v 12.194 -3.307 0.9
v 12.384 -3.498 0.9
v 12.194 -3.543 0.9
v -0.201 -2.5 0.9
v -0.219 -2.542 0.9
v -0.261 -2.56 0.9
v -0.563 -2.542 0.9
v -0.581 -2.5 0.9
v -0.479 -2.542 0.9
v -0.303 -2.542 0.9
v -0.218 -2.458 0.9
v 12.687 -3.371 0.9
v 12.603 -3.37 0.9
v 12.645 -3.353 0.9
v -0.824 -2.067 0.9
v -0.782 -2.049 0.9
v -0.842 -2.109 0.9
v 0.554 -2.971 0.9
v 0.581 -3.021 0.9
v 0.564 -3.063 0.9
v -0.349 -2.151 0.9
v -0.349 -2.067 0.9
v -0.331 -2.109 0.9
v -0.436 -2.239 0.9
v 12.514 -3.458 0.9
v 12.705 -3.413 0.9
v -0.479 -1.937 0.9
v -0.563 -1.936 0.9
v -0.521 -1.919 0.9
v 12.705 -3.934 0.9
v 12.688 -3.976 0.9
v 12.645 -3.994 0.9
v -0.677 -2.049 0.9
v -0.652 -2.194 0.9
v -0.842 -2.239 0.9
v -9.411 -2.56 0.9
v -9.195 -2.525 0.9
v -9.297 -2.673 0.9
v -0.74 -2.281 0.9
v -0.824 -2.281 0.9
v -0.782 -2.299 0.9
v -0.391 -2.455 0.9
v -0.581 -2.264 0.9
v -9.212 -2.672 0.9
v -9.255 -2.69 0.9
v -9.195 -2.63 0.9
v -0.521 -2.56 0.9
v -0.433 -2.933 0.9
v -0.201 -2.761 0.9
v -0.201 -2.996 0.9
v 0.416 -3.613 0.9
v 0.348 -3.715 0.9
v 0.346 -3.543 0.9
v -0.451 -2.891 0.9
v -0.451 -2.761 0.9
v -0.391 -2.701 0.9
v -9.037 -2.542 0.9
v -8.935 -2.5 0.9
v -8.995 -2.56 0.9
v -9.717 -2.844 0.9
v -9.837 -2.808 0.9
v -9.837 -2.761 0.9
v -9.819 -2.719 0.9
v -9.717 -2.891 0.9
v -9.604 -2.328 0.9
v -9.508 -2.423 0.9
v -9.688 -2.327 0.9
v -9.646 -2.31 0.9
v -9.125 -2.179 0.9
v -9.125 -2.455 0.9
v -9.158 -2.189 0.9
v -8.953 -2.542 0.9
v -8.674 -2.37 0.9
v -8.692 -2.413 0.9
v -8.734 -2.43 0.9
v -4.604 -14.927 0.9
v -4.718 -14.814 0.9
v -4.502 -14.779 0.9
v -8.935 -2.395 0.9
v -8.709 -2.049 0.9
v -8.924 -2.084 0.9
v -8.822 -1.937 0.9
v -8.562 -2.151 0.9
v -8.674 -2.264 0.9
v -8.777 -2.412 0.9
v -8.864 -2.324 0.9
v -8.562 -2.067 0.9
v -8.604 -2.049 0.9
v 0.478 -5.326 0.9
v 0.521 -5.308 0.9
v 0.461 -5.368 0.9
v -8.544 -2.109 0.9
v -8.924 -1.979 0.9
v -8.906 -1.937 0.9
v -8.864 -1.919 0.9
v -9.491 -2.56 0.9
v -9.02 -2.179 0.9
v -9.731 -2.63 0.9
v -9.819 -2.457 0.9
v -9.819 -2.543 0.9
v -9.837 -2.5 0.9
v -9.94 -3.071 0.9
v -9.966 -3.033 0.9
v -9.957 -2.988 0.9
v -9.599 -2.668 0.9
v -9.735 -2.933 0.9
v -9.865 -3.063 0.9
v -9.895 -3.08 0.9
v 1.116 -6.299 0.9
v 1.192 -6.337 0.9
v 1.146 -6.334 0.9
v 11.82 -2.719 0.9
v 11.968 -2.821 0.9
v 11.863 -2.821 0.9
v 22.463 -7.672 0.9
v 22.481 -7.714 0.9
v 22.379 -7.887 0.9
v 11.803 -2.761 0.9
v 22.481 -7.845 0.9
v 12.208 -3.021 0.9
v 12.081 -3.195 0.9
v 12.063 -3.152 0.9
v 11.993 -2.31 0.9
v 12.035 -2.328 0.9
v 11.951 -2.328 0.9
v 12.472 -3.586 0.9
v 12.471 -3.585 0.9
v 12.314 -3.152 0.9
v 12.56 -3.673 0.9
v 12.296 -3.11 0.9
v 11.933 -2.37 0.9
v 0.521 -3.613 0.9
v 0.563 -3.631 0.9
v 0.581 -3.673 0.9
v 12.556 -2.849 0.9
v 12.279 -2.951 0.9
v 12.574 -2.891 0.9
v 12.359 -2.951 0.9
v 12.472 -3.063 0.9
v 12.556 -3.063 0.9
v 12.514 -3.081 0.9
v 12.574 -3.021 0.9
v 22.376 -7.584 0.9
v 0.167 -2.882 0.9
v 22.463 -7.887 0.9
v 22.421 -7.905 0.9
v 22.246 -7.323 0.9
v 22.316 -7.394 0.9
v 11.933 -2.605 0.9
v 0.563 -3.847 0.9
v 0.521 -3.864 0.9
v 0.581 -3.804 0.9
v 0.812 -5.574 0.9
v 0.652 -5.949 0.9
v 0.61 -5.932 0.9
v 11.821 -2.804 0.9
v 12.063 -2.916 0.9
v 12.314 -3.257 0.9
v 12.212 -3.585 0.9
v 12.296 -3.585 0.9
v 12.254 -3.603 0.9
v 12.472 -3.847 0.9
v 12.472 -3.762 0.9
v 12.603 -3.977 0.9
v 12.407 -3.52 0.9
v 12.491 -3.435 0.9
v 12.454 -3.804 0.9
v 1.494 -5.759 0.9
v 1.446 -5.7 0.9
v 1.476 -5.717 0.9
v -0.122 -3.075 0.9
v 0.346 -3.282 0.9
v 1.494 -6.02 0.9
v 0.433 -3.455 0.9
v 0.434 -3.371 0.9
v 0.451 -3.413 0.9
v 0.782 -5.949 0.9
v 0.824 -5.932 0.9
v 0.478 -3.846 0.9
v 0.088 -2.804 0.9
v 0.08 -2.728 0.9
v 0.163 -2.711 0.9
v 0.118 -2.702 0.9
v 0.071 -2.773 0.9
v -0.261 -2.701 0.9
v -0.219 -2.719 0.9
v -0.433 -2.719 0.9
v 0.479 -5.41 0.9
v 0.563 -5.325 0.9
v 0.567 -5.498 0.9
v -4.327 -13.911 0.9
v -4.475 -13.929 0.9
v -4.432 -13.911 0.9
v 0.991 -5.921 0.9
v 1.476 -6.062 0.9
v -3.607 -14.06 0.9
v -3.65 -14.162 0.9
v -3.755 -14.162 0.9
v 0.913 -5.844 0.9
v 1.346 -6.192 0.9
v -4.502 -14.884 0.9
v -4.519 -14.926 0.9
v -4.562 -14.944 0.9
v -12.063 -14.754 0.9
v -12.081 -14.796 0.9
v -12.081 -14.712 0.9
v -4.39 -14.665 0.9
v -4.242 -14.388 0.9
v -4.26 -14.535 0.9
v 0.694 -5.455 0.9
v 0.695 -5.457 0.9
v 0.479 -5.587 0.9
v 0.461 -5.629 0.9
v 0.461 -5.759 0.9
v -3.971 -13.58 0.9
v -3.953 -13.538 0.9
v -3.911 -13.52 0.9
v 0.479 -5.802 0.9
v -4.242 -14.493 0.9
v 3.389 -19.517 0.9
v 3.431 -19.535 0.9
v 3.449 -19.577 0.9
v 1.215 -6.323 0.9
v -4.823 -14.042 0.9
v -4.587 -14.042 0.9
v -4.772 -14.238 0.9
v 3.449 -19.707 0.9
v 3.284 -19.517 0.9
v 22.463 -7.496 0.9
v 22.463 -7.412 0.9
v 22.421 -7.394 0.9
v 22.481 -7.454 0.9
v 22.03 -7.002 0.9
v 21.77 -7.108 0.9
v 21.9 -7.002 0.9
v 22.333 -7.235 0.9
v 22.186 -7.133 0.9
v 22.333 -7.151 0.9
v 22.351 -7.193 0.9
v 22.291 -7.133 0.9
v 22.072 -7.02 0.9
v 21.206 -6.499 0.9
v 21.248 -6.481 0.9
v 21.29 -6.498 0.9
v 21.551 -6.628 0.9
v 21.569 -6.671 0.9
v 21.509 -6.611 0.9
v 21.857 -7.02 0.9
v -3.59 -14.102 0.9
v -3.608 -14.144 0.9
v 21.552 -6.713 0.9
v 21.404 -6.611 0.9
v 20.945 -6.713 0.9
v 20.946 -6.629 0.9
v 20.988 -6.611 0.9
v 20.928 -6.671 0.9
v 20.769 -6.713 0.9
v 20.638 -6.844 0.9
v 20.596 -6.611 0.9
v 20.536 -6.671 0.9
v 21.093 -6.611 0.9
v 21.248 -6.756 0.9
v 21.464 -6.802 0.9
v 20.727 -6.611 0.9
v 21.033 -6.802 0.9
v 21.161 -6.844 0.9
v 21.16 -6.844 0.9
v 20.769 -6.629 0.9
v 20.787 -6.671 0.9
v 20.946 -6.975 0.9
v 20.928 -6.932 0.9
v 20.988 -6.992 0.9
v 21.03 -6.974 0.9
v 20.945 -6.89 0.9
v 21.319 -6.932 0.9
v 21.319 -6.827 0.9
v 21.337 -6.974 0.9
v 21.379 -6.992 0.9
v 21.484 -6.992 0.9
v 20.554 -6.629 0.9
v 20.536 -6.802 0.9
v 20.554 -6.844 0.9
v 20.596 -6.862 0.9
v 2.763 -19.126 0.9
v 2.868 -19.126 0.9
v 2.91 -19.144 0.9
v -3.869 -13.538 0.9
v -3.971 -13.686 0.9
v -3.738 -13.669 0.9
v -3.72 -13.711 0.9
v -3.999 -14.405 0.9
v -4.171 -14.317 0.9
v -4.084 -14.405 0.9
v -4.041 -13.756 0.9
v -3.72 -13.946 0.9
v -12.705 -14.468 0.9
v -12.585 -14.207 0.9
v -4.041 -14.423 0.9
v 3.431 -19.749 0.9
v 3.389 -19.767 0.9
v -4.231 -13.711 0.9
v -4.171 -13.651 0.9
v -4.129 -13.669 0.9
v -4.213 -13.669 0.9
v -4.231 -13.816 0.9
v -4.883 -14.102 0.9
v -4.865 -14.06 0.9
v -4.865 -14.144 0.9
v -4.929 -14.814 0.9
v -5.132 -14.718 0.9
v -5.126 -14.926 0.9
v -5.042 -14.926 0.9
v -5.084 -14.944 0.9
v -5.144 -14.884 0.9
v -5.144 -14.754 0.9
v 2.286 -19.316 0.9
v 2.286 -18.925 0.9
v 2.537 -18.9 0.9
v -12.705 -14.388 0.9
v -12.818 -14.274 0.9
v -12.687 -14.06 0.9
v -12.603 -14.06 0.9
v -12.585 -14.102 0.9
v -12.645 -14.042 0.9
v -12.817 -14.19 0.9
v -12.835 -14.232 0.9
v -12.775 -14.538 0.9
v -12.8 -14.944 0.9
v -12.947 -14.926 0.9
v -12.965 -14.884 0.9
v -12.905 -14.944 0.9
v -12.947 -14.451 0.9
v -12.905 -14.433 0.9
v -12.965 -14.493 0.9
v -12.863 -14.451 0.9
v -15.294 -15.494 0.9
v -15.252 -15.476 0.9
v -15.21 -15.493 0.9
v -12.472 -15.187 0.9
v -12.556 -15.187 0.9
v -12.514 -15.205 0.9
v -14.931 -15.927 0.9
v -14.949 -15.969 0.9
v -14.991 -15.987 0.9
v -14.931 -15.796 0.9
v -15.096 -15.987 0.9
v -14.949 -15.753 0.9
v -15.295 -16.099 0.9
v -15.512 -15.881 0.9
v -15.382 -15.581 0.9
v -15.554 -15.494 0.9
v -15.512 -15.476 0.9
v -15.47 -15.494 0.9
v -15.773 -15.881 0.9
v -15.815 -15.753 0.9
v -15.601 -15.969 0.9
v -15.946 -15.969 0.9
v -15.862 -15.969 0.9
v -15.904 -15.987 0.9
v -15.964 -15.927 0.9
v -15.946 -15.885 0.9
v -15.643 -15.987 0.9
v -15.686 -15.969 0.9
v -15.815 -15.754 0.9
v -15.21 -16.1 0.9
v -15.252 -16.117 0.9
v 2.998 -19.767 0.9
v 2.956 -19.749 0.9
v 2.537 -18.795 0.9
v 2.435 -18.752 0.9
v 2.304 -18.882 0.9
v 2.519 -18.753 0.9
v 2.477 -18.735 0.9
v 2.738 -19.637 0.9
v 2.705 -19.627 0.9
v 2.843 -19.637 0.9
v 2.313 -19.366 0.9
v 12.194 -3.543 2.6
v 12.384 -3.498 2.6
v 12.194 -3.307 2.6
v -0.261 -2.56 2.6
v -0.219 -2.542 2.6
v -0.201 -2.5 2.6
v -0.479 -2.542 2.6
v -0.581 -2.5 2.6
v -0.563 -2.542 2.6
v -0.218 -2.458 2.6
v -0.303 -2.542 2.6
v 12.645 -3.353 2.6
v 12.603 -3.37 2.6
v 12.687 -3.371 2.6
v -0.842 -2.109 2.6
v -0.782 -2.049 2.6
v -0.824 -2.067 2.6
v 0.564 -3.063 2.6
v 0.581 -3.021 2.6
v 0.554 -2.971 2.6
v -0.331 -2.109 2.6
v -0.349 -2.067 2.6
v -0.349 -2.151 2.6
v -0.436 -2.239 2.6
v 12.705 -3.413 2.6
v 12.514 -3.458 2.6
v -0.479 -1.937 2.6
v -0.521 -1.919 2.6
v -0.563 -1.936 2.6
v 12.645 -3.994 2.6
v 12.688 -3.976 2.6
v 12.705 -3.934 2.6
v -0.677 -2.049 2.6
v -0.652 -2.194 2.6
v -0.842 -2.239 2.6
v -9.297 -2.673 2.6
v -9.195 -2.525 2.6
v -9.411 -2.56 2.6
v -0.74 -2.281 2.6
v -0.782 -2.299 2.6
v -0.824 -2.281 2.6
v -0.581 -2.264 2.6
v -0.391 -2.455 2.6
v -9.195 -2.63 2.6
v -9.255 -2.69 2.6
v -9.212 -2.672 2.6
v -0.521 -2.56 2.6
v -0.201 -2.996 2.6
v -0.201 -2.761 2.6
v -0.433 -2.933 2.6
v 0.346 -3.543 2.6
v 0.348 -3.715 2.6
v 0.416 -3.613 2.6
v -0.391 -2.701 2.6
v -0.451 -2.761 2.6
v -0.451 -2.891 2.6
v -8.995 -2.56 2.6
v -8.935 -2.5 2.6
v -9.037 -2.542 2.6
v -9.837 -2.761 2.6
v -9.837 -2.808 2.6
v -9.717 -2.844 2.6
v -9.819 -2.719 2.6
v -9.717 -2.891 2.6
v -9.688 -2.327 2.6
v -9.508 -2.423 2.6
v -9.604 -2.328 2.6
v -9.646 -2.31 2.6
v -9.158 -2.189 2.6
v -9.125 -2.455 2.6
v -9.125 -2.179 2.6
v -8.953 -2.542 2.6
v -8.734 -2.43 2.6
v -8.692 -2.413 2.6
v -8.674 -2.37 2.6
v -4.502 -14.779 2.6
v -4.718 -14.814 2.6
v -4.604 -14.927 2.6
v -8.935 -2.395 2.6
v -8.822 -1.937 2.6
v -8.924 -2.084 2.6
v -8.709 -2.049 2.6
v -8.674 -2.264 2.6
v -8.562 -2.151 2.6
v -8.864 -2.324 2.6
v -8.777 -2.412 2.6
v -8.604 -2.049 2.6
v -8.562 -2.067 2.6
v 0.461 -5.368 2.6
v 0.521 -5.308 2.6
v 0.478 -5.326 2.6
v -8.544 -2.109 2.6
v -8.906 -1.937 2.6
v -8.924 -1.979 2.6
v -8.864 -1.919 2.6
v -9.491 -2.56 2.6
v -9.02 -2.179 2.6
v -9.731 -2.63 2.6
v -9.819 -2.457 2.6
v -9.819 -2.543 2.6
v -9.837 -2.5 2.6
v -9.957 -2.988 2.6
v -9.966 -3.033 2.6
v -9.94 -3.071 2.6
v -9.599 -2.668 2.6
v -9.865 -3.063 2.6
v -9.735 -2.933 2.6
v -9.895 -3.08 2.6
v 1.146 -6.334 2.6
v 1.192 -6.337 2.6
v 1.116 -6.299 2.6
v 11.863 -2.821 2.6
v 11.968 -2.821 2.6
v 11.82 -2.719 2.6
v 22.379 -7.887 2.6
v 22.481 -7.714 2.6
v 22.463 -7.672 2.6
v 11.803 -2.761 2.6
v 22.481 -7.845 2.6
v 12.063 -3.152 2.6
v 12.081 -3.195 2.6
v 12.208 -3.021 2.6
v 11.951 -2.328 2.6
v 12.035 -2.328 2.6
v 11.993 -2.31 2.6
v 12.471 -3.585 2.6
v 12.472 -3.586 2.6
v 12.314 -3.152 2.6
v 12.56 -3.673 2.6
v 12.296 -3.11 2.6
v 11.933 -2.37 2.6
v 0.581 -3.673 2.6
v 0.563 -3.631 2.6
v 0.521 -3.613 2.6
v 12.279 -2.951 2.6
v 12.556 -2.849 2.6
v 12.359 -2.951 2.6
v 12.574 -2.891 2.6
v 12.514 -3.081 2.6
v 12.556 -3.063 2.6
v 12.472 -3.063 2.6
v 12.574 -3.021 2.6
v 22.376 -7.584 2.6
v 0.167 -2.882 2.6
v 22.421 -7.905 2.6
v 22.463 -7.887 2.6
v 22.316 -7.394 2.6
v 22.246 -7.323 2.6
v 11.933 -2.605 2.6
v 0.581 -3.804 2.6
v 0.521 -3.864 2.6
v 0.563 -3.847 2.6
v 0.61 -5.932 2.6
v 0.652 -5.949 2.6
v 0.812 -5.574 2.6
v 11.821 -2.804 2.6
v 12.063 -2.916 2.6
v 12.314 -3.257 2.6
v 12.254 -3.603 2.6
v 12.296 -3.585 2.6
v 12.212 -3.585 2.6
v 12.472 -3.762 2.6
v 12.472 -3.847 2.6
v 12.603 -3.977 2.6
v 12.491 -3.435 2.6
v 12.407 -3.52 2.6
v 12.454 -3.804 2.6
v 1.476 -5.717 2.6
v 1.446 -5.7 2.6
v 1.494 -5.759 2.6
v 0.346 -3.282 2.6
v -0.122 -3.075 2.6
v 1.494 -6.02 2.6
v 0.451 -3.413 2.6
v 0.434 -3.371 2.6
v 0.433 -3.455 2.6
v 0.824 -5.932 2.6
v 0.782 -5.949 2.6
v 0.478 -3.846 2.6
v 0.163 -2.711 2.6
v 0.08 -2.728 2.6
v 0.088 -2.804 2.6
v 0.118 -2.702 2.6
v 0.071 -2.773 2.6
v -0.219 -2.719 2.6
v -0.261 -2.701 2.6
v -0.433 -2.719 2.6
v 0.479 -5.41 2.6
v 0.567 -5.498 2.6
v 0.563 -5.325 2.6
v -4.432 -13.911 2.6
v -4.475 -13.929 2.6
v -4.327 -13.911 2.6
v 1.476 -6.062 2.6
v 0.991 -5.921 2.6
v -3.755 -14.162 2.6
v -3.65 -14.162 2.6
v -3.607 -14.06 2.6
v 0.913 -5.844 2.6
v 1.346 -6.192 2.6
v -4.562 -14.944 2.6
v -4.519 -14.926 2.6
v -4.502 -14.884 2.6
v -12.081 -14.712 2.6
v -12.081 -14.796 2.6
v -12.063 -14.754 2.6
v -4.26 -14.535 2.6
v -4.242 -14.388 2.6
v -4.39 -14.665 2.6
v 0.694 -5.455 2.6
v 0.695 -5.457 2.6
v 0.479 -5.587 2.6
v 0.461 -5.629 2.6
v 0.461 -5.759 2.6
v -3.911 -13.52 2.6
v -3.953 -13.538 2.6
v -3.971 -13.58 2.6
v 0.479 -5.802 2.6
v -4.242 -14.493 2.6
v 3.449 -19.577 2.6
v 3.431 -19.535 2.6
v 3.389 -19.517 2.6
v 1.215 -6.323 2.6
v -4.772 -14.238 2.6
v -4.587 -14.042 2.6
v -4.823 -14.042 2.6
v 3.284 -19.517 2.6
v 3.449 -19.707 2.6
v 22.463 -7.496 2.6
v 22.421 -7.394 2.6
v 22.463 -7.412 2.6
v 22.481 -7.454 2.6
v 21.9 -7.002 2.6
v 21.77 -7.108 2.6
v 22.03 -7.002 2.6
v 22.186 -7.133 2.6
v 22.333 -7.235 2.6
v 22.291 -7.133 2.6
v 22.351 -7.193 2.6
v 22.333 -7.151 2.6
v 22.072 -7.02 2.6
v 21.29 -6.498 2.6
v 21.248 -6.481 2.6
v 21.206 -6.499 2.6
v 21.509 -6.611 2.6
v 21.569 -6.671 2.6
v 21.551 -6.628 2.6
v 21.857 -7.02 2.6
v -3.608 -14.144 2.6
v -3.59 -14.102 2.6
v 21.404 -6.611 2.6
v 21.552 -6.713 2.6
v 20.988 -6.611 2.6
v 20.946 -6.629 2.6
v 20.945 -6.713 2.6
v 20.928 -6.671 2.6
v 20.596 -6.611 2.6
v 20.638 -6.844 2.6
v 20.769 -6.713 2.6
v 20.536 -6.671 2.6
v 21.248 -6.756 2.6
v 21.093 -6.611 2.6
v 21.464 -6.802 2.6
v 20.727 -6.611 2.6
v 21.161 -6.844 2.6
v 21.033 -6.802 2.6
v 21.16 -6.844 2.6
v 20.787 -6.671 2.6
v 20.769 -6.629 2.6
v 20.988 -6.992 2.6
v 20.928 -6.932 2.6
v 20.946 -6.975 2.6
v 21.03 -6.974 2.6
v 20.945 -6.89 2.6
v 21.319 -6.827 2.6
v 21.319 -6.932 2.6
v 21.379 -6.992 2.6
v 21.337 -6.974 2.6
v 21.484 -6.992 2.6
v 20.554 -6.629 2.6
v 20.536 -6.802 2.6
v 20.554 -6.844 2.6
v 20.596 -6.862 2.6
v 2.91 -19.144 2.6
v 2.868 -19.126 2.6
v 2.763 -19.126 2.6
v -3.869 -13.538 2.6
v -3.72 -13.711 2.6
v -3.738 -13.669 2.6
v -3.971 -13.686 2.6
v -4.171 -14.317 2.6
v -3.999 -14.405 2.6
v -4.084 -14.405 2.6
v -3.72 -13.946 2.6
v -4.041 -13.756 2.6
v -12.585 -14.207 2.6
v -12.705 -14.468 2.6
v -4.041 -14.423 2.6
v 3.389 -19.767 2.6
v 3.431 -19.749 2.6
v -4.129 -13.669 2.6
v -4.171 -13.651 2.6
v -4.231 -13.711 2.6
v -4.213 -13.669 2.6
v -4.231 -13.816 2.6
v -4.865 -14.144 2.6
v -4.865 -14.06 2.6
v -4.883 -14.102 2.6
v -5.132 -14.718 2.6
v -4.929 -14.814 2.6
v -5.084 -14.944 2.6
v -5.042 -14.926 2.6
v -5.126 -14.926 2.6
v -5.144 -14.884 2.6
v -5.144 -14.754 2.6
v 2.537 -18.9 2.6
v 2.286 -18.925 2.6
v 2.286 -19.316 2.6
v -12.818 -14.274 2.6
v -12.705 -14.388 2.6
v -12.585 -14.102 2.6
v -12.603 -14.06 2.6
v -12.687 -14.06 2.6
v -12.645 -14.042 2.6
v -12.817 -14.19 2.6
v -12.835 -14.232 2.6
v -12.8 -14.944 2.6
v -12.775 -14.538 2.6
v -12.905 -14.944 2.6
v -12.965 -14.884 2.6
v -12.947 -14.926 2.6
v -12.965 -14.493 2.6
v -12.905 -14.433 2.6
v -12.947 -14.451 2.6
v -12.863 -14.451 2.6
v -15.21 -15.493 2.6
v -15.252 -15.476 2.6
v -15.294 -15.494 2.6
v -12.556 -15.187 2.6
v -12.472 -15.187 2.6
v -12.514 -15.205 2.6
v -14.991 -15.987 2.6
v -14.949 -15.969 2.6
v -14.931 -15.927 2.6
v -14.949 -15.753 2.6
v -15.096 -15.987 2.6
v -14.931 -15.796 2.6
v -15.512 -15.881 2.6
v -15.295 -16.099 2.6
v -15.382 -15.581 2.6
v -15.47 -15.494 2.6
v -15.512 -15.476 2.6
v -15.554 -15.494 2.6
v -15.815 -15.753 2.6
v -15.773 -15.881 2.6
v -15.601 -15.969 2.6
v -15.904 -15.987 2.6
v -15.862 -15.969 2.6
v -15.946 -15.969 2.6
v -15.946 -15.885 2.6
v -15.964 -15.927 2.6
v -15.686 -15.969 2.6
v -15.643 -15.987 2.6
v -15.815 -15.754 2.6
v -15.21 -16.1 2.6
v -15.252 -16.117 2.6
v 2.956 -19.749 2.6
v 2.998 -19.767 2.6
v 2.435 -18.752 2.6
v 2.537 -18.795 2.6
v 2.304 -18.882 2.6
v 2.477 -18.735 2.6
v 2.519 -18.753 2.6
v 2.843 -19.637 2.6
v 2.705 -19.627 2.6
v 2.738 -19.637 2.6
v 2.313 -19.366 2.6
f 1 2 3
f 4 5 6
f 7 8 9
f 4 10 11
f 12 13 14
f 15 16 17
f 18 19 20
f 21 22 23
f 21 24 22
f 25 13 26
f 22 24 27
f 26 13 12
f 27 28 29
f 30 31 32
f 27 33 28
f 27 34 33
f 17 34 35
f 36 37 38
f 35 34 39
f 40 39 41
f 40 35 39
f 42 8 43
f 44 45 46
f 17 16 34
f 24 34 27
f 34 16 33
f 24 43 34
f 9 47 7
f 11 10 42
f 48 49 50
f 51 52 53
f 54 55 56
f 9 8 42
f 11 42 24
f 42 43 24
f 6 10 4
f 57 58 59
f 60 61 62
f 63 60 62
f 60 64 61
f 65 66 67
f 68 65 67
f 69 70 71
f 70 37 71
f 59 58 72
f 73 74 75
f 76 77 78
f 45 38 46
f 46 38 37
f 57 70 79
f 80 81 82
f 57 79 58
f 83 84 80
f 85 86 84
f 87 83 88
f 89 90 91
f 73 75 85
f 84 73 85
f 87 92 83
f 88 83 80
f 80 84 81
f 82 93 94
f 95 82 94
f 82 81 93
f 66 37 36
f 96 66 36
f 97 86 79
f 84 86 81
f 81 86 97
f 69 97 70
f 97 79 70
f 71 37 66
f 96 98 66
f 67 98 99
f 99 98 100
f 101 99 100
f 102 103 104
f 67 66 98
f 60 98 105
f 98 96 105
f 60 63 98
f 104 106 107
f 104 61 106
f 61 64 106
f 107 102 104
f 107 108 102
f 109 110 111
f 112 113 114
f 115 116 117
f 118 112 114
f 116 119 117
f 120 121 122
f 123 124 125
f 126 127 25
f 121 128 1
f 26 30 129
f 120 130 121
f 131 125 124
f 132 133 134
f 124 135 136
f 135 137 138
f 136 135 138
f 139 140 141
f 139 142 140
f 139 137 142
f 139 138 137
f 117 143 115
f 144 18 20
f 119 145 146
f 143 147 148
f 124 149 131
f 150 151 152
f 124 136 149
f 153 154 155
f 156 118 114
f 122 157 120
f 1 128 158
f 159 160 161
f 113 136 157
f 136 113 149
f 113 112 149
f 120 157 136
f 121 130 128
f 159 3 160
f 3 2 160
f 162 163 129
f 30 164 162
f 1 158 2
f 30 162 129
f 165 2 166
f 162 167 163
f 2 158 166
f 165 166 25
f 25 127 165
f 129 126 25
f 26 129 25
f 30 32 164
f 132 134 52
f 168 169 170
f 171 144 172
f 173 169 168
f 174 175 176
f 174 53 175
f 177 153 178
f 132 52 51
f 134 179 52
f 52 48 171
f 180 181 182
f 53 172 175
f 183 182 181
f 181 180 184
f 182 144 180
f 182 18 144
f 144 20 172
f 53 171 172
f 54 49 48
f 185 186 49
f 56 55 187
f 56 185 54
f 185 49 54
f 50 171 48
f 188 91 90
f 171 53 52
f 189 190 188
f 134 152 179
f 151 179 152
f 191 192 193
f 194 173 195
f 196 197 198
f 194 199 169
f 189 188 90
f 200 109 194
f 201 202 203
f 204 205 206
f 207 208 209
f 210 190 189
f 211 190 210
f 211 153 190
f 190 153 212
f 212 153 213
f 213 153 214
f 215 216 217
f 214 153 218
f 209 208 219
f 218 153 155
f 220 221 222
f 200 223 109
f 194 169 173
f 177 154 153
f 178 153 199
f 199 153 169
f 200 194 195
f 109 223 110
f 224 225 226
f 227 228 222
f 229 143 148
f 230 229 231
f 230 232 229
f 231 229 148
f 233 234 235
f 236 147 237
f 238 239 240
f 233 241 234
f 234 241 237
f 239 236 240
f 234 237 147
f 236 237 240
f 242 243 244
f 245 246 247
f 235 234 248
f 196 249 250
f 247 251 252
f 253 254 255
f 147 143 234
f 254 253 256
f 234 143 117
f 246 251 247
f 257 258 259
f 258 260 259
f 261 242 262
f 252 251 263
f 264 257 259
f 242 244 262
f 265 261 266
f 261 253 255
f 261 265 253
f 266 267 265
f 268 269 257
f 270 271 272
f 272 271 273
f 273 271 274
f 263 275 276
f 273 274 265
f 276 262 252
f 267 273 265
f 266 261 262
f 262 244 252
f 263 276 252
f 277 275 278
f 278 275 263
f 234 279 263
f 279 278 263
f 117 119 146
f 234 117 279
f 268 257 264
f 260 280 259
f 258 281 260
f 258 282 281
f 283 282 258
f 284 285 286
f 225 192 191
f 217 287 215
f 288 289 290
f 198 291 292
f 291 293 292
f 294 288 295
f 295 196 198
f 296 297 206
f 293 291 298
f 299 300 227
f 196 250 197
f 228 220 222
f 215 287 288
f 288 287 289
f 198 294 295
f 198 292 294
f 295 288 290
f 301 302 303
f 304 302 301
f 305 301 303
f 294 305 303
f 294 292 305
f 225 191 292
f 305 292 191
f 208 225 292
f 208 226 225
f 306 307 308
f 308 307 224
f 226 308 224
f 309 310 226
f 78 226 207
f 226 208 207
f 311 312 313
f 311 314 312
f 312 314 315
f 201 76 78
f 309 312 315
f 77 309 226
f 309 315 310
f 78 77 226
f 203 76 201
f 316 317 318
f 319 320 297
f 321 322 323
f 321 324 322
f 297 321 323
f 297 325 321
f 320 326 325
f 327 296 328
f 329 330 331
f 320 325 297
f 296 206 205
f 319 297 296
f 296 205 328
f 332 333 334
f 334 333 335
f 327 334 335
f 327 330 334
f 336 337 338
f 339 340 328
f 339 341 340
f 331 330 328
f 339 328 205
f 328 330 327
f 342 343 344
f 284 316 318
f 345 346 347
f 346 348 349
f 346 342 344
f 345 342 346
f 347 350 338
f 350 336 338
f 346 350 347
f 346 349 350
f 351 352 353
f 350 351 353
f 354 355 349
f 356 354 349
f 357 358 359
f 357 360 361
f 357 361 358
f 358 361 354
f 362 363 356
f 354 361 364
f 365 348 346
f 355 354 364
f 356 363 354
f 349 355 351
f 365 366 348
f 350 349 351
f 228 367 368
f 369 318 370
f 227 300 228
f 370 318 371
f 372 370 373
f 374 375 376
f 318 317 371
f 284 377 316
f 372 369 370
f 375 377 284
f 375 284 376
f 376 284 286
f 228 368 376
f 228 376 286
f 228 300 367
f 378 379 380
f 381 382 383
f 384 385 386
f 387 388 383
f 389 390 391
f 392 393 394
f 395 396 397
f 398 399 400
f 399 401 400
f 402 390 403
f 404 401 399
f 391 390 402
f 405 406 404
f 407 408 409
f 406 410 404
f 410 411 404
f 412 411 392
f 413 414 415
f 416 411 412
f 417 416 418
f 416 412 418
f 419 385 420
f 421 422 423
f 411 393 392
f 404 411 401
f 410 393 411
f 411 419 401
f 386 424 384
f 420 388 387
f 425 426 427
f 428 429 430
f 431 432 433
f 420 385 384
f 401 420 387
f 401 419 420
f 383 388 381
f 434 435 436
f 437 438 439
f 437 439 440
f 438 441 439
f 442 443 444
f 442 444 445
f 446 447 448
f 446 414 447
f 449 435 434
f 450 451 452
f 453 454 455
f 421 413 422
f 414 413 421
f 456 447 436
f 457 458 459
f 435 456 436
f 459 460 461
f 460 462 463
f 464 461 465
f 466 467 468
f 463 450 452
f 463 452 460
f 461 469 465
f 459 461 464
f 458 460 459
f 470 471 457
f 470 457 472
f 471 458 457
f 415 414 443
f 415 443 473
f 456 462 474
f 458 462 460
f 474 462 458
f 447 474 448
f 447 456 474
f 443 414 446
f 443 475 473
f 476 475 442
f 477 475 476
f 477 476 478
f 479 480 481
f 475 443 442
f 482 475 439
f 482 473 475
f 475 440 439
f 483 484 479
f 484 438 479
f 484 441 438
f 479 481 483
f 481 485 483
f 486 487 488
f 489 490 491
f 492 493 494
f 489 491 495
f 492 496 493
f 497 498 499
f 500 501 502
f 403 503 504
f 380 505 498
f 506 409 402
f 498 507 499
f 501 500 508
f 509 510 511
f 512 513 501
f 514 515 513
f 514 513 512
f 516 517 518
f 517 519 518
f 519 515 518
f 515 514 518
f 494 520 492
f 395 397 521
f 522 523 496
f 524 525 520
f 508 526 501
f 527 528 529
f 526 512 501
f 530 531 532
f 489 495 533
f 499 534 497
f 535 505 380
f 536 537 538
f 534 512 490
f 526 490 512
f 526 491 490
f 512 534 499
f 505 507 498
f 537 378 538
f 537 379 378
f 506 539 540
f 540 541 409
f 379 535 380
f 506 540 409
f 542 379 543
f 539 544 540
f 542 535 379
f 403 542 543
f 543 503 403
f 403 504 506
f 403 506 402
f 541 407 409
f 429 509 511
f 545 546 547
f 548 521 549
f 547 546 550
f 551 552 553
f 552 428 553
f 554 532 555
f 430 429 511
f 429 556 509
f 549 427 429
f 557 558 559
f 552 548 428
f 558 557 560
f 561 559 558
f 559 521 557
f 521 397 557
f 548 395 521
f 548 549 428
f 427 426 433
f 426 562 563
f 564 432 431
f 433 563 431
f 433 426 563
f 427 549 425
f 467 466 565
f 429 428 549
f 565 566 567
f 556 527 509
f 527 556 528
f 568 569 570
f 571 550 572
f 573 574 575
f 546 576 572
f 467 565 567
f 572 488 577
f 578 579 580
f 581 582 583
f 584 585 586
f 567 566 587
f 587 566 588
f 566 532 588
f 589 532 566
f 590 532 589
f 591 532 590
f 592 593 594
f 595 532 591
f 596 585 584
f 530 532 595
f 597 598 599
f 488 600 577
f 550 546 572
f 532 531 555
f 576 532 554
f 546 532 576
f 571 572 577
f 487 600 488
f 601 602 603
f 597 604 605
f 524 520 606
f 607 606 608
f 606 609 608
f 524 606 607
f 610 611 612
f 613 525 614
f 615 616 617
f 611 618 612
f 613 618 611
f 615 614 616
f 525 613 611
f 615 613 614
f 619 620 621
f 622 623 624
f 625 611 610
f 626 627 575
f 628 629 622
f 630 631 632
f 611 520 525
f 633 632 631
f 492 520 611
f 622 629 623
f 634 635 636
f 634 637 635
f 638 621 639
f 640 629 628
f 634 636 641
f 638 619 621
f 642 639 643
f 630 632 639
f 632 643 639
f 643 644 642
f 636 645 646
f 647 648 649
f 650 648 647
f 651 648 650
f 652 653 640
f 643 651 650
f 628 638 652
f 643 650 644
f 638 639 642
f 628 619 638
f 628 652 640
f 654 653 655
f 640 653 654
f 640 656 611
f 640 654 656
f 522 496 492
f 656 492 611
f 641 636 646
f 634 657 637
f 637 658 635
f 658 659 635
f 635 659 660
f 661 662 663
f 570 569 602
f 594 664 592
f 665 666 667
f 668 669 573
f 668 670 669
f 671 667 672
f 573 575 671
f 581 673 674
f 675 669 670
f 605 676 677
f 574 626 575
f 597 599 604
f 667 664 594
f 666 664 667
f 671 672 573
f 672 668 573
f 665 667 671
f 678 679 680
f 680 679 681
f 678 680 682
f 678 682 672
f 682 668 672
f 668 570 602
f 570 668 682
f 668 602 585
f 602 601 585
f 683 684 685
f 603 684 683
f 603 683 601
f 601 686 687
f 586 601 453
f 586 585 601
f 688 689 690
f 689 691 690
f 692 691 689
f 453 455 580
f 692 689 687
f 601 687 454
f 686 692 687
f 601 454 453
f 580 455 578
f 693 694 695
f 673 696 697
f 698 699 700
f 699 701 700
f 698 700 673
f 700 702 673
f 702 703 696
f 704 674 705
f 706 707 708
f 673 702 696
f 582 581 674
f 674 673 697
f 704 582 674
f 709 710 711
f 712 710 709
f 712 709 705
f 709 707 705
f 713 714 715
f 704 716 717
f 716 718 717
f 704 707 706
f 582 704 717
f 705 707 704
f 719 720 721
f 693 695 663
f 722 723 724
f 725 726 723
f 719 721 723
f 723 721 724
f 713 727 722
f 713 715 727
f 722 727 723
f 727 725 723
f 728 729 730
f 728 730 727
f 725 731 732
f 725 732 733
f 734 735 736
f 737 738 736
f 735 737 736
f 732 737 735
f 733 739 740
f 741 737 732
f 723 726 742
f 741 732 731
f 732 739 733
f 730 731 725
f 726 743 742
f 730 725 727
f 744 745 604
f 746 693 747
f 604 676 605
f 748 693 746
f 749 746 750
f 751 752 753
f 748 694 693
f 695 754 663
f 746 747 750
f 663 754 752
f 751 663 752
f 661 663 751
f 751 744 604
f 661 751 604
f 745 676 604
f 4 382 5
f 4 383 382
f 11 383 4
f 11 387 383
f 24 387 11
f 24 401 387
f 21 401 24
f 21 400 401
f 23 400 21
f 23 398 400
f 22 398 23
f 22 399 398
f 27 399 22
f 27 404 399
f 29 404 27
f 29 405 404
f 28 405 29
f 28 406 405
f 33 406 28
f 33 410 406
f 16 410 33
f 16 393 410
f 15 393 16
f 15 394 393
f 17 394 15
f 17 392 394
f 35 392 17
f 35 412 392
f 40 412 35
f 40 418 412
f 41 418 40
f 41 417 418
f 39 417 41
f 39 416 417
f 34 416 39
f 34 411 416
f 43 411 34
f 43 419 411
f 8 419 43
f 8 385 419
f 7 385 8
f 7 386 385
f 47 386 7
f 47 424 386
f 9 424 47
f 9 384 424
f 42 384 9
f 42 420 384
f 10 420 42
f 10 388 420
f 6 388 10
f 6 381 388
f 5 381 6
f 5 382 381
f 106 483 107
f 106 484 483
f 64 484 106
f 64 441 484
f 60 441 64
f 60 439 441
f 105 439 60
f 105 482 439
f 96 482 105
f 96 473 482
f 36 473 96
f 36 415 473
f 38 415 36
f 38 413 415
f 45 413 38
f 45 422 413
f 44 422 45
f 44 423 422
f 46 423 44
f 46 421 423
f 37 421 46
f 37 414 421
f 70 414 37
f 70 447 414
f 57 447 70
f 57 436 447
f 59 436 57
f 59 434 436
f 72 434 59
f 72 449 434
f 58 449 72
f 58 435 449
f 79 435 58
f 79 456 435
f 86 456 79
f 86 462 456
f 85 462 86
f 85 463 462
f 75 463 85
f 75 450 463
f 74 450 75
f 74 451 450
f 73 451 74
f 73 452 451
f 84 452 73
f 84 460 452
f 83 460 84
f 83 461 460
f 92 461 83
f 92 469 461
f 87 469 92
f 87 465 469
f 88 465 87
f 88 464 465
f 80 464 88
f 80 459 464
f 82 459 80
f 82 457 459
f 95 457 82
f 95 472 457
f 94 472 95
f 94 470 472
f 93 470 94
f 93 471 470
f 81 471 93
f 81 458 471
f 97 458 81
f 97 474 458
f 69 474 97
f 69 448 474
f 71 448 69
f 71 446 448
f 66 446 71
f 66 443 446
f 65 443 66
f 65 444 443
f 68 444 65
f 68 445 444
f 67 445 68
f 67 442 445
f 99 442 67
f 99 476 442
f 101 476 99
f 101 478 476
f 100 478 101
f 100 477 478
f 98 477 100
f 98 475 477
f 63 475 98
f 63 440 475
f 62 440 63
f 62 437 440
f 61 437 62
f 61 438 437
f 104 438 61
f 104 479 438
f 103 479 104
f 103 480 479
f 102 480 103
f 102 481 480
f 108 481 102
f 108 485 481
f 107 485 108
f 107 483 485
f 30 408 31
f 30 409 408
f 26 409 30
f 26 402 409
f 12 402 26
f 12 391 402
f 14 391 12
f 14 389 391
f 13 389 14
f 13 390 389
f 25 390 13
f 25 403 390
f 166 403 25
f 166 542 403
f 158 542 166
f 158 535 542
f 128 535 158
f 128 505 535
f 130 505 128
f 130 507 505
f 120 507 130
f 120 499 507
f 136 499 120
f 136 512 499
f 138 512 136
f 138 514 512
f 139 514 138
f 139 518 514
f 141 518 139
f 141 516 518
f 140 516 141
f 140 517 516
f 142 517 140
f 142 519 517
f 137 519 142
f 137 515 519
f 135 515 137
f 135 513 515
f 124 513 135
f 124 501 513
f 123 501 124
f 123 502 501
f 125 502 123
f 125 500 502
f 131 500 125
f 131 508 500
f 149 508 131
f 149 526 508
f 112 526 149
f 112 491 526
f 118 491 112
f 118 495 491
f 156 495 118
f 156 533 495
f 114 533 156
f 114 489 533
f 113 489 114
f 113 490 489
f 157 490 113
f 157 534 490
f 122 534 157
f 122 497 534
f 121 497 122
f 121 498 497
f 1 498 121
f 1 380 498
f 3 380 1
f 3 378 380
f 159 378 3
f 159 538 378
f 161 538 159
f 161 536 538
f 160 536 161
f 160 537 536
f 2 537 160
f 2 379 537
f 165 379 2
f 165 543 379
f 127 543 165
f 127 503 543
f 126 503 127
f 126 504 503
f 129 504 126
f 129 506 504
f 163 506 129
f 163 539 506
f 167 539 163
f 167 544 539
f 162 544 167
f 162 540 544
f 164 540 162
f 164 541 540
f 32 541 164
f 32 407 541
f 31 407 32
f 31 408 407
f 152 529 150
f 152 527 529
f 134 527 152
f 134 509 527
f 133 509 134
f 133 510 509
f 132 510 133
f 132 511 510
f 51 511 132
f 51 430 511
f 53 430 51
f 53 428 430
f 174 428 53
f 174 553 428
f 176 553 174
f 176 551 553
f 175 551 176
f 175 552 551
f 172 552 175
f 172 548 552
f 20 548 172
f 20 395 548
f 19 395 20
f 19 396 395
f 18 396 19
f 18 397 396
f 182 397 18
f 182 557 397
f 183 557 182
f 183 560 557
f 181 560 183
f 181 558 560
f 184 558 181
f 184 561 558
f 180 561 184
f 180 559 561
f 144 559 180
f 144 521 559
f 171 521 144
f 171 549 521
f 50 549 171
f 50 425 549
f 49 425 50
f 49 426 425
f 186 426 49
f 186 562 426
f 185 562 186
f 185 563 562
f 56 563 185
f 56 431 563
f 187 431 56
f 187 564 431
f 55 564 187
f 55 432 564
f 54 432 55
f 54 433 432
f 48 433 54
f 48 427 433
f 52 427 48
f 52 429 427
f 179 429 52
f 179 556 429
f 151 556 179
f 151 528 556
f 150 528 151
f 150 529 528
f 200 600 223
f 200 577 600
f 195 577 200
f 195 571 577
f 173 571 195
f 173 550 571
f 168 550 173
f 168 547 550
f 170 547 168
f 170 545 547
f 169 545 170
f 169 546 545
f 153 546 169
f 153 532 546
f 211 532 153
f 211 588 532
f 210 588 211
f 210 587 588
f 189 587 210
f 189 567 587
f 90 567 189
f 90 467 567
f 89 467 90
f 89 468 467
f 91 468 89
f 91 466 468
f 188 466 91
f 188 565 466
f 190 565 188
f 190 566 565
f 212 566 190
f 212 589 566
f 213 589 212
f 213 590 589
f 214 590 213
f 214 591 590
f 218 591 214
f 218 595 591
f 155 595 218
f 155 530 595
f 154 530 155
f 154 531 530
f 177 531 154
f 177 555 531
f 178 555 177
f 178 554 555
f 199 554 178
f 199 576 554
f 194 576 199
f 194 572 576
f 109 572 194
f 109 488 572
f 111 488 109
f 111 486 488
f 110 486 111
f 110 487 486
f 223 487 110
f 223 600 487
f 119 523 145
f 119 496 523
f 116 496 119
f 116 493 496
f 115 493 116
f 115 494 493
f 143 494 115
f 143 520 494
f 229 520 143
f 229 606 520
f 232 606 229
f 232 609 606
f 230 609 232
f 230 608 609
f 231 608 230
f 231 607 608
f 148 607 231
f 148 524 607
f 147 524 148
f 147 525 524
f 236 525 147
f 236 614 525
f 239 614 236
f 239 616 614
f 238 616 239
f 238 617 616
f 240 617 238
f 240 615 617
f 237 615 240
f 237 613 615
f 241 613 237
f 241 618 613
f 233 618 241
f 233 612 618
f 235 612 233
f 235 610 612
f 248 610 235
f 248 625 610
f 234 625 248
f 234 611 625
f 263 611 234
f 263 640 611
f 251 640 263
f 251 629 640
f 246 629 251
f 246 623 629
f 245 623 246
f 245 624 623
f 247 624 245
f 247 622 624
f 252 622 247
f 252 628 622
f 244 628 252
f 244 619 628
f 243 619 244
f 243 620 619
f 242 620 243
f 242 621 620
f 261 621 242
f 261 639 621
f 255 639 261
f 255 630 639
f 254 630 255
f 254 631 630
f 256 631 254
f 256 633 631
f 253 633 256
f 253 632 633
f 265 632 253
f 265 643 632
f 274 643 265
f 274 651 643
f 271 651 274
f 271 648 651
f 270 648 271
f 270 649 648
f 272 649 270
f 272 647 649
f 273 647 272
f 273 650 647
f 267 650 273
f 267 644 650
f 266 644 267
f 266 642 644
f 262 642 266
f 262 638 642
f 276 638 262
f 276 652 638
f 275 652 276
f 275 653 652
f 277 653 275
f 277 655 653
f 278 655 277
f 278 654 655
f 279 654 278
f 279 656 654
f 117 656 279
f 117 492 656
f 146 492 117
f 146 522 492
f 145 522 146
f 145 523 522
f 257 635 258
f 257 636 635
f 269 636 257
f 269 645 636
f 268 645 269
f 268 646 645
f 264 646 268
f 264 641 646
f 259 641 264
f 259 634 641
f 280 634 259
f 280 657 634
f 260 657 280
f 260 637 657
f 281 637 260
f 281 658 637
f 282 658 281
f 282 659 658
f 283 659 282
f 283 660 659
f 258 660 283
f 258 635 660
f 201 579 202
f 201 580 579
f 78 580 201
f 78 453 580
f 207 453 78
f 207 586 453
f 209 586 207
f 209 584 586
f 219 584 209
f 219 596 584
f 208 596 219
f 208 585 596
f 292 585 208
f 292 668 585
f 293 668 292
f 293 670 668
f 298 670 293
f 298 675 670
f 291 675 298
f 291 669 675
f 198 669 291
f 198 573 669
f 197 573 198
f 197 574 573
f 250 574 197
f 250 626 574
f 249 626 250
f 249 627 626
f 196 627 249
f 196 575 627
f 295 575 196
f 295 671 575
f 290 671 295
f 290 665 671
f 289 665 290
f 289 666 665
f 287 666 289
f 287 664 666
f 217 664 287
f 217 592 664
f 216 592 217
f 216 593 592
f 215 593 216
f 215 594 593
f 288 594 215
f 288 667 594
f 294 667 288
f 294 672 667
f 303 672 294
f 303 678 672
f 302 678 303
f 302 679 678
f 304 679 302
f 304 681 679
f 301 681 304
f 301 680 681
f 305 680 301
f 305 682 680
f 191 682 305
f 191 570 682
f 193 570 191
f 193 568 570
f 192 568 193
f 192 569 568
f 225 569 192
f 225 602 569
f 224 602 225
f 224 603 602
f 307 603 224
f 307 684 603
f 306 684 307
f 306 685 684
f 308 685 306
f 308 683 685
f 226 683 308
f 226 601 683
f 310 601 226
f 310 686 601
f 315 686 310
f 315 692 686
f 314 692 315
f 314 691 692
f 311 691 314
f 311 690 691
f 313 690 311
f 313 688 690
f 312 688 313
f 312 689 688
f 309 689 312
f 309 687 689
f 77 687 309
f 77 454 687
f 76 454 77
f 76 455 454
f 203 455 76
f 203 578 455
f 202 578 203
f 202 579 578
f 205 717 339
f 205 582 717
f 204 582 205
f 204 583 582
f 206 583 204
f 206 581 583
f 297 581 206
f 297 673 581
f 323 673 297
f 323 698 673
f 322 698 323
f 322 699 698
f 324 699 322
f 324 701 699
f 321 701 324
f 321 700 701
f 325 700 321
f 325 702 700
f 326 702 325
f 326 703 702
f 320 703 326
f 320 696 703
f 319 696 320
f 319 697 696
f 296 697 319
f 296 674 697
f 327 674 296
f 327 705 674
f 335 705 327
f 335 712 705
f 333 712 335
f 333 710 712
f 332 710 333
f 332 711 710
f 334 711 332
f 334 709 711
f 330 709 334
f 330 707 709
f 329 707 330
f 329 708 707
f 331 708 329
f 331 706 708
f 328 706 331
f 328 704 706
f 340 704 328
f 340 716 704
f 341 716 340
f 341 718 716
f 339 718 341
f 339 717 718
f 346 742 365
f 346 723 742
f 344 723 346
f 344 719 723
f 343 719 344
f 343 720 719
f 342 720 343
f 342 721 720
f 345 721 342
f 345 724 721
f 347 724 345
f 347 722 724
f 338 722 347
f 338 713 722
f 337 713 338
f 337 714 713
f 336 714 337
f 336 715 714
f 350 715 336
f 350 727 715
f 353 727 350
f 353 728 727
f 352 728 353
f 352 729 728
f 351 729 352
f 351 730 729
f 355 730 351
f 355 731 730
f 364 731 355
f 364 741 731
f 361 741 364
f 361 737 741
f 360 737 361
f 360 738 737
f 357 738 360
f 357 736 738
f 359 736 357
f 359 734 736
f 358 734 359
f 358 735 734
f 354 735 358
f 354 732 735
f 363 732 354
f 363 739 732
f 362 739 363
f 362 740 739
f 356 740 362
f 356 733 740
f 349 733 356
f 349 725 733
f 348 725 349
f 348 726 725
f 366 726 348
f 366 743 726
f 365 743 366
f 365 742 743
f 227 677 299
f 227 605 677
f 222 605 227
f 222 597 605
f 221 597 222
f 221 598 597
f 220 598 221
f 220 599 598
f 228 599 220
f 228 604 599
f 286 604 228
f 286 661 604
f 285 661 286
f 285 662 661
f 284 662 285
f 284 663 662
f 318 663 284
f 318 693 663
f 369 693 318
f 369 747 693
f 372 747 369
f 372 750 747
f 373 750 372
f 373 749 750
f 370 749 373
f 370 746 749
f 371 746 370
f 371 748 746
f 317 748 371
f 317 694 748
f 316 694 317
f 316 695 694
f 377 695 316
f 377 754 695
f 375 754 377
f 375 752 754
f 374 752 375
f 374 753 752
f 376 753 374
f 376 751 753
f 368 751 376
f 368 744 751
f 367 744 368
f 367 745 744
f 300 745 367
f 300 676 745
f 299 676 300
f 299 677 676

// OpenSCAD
$fn = 24;
translate([0, -2.500, 0.900])
  linear_extrude(height=1.700) {
offset(r=0.06, $fn=8) {
    polygon(points=[[2.346,-16.425],[2.346,-16.816],[2.738,-17.077],[2.607,-17.207],[2.738,-17.077],[2.868,-17.077],[2.998,-17.207],[3.389,-17.207],[3.389,-17.077],[3.259,-17.077],[2.868,-16.686],[2.738,-16.686],[2.477,-16.425],[2.477,-16.295]], paths=[[0,1,2,3,4,5,6,7,8,9,10,11,12,13]]);
    polygon(points=[[-15.904,-13.427],[-15.773,-13.296],[-15.643,-13.427],[-15.512,-13.296],[-15.252,-13.557],[-15.121,-13.427],[-14.991,-13.427],[-14.991,-13.296],[-14.861,-13.166],[-14.730,-13.296],[-14.861,-13.166],[-14.991,-13.296],[-15.252,-13.036],[-15.382,-13.166],[-15.512,-13.036]], paths=[[0,1,2,3,4,5,6,7,8,9,10,11,12,13,14]]);
    polygon(points=[[-12.645,-11.602],[-12.775,-11.732],[-12.645,-11.863],[-12.645,-11.993],[-12.775,-12.123],[-12.905,-11.993],[-12.905,-12.384],[-12.775,-12.384],[-12.384,-12.775],[-12.514,-12.645],[-12.123,-12.254],[-12.645,-11.732]], paths=[[0,1,2,3,4,5,6,7,8,9,10,11]]);
    polygon(points=[[-3.780,-11.211],[-3.911,-11.080],[-3.911,-11.211],[-4.041,-11.341],[-4.171,-11.211],[-4.171,-11.341],[-4.302,-11.471],[-4.432,-11.471],[-4.562,-11.341],[-4.432,-11.471],[-4.562,-11.602],[-4.823,-11.602],[-4.693,-11.732],[-5.084,-12.254],[-5.084,-12.384],[-4.954,-12.254],[-4.693,-12.254],[-4.562,-12.384],[-4.562,-12.254],[-4.432,-12.123],[-4.302,-12.254],[-4.432,-12.123],[-4.302,-11.993],[-4.302,-11.863],[-4.171,-11.732],[-4.041,-11.863],[-3.780,-11.602],[-3.650,-11.602],[-3.780,-11.471]], paths=[[0,1,2,3,4,5,6,7,8,9,10,11,12,13,14,15,16,17,18,19,20,21,22,23,24,25,26,27,28]]);
    polygon(points=[[20.596,-4.171],[20.596,-4.302],[20.727,-4.171],[20.988,-4.171],[21.118,-4.302],[20.988,-4.432],[21.248,-4.171],[21.379,-4.302],[21.379,-4.432],[21.248,-4.562],[21.379,-4.432],[21.509,-4.432],[22.421,-5.345],[22.421,-5.475],[22.552,-5.605],[22.682,-5.475],[22.552,-5.605],[22.421,-5.475],[22.421,-5.214],[22.291,-5.084],[22.421,-4.954],[22.291,-4.954],[22.161,-4.823],[22.291,-4.693],[22.161,-4.693],[22.030,-4.562],[21.900,-4.562],[21.770,-4.693],[21.379,-4.302],[21.509,-4.171],[21.379,-4.171],[21.248,-4.041],[21.379,-3.911],[21.248,-4.041],[21.118,-3.911],[21.248,-4.041],[21.118,-4.171]], paths=[[0,1,2,3,4,5,6,7,8,9,10,11,12,13,14,15,16,17,18,19,20,21,22,23,24,25,26,27,28,29,30,31,32,33,34,35,36]]);
    polygon(points=[[0.521,-2.868],[0.652,-2.998],[0.521,-3.129],[0.521,-3.259],[0.652,-3.389],[0.782,-3.389],[0.913,-3.259],[1.043,-3.389],[1.173,-3.780],[1.304,-3.650],[1.434,-3.780],[1.304,-3.650],[1.434,-3.520],[1.434,-3.259],[0.782,-3.129]], paths=[[0,1,2,3,4,5,6,7,8,9,10,11,12,13,14]]);
    polygon(points=[[12.123,0.261],[11.993,0.130],[11.993,-0.130],[11.863,-0.261],[11.993,-0.261],[12.123,-0.391],[12.123,-0.652],[11.993,-0.782],[11.993,-0.913],[11.993,-0.782],[12.123,-0.652],[12.254,-0.782],[12.254,-1.043],[12.384,-0.913],[12.645,-1.173],[12.514,-1.304],[12.645,-1.434],[12.645,-1.825],[12.645,-0.782],[12.645,-0.913],[12.514,-1.043],[12.254,-0.782],[12.254,-0.652],[12.123,-0.521],[12.254,-0.391],[12.384,-0.391],[12.514,-0.521],[12.514,-0.391],[11.993,0.130]], paths=[[0,1,2,3,4,5,6,7,8,9,10,11,12,13,14,15,16,17,18,19,20,21,22,23,24,25,26,27,28]]);
    polygon(points=[[-0.652,0.652],[-0.521,0.521],[-0.652,0.391],[-0.782,0.391],[-0.782,0.261],[-0.652,0.391],[-0.521,0.261],[-0.521,-0.130],[-0.391,-0.261],[-0.391,-0.391],[0.391,-1.173],[0.261,-1.304],[0.391,-1.173],[0.521,-1.304],[0.521,-1.173],[0.391,-1.173],[0.261,-1.043],[0.391,-0.913],[0.261,-0.782],[0.521,-0.521],[0.130,-0.261],[0.261,-0.130],[0.130,-0.261],[0.261,-0.391],[-0.130,-0.652],[-0.261,-0.521],[-0.261,-0.261],[-0.391,-0.261],[-0.521,-0.130],[-0.521,0.000],[-0.391,0.130],[-0.261,0.000],[-0.521,0.261],[-0.391,0.391]], paths=[[0,1,2,3,4,5,6,7,8,9,10,11,12,13,14,15,16,17,18,19,20,21,22,23,24,25,26,27,28,29,30,31,32,33]]);
    polygon(points=[[-8.343,0.652],[-8.604,0.391],[-8.734,0.391],[-8.864,0.521],[-8.864,0.391],[-8.995,0.261],[-9.125,0.261],[-9.516,0.000],[-9.646,0.130],[-9.777,0.000],[-9.646,-0.130],[-9.777,-0.261],[-9.777,-0.391],[-9.907,-0.521],[-10.037,-0.391],[-9.907,-0.521],[-9.646,-0.130],[-9.516,-0.261],[-9.646,-0.130],[-9.516,0.000],[-9.386,0.000],[-9.255,-0.130],[-9.255,0.000],[-9.125,0.130],[-8.995,0.000],[-8.995,0.130],[-8.864,0.261],[-8.734,0.130],[-8.734,0.261]], paths=[[0,1,2,3,4,5,6,7,8,9,10,11,12,13,14,15,16,17,18,19,20,21,22,23,24,25,26,27,28]]);
}
}
